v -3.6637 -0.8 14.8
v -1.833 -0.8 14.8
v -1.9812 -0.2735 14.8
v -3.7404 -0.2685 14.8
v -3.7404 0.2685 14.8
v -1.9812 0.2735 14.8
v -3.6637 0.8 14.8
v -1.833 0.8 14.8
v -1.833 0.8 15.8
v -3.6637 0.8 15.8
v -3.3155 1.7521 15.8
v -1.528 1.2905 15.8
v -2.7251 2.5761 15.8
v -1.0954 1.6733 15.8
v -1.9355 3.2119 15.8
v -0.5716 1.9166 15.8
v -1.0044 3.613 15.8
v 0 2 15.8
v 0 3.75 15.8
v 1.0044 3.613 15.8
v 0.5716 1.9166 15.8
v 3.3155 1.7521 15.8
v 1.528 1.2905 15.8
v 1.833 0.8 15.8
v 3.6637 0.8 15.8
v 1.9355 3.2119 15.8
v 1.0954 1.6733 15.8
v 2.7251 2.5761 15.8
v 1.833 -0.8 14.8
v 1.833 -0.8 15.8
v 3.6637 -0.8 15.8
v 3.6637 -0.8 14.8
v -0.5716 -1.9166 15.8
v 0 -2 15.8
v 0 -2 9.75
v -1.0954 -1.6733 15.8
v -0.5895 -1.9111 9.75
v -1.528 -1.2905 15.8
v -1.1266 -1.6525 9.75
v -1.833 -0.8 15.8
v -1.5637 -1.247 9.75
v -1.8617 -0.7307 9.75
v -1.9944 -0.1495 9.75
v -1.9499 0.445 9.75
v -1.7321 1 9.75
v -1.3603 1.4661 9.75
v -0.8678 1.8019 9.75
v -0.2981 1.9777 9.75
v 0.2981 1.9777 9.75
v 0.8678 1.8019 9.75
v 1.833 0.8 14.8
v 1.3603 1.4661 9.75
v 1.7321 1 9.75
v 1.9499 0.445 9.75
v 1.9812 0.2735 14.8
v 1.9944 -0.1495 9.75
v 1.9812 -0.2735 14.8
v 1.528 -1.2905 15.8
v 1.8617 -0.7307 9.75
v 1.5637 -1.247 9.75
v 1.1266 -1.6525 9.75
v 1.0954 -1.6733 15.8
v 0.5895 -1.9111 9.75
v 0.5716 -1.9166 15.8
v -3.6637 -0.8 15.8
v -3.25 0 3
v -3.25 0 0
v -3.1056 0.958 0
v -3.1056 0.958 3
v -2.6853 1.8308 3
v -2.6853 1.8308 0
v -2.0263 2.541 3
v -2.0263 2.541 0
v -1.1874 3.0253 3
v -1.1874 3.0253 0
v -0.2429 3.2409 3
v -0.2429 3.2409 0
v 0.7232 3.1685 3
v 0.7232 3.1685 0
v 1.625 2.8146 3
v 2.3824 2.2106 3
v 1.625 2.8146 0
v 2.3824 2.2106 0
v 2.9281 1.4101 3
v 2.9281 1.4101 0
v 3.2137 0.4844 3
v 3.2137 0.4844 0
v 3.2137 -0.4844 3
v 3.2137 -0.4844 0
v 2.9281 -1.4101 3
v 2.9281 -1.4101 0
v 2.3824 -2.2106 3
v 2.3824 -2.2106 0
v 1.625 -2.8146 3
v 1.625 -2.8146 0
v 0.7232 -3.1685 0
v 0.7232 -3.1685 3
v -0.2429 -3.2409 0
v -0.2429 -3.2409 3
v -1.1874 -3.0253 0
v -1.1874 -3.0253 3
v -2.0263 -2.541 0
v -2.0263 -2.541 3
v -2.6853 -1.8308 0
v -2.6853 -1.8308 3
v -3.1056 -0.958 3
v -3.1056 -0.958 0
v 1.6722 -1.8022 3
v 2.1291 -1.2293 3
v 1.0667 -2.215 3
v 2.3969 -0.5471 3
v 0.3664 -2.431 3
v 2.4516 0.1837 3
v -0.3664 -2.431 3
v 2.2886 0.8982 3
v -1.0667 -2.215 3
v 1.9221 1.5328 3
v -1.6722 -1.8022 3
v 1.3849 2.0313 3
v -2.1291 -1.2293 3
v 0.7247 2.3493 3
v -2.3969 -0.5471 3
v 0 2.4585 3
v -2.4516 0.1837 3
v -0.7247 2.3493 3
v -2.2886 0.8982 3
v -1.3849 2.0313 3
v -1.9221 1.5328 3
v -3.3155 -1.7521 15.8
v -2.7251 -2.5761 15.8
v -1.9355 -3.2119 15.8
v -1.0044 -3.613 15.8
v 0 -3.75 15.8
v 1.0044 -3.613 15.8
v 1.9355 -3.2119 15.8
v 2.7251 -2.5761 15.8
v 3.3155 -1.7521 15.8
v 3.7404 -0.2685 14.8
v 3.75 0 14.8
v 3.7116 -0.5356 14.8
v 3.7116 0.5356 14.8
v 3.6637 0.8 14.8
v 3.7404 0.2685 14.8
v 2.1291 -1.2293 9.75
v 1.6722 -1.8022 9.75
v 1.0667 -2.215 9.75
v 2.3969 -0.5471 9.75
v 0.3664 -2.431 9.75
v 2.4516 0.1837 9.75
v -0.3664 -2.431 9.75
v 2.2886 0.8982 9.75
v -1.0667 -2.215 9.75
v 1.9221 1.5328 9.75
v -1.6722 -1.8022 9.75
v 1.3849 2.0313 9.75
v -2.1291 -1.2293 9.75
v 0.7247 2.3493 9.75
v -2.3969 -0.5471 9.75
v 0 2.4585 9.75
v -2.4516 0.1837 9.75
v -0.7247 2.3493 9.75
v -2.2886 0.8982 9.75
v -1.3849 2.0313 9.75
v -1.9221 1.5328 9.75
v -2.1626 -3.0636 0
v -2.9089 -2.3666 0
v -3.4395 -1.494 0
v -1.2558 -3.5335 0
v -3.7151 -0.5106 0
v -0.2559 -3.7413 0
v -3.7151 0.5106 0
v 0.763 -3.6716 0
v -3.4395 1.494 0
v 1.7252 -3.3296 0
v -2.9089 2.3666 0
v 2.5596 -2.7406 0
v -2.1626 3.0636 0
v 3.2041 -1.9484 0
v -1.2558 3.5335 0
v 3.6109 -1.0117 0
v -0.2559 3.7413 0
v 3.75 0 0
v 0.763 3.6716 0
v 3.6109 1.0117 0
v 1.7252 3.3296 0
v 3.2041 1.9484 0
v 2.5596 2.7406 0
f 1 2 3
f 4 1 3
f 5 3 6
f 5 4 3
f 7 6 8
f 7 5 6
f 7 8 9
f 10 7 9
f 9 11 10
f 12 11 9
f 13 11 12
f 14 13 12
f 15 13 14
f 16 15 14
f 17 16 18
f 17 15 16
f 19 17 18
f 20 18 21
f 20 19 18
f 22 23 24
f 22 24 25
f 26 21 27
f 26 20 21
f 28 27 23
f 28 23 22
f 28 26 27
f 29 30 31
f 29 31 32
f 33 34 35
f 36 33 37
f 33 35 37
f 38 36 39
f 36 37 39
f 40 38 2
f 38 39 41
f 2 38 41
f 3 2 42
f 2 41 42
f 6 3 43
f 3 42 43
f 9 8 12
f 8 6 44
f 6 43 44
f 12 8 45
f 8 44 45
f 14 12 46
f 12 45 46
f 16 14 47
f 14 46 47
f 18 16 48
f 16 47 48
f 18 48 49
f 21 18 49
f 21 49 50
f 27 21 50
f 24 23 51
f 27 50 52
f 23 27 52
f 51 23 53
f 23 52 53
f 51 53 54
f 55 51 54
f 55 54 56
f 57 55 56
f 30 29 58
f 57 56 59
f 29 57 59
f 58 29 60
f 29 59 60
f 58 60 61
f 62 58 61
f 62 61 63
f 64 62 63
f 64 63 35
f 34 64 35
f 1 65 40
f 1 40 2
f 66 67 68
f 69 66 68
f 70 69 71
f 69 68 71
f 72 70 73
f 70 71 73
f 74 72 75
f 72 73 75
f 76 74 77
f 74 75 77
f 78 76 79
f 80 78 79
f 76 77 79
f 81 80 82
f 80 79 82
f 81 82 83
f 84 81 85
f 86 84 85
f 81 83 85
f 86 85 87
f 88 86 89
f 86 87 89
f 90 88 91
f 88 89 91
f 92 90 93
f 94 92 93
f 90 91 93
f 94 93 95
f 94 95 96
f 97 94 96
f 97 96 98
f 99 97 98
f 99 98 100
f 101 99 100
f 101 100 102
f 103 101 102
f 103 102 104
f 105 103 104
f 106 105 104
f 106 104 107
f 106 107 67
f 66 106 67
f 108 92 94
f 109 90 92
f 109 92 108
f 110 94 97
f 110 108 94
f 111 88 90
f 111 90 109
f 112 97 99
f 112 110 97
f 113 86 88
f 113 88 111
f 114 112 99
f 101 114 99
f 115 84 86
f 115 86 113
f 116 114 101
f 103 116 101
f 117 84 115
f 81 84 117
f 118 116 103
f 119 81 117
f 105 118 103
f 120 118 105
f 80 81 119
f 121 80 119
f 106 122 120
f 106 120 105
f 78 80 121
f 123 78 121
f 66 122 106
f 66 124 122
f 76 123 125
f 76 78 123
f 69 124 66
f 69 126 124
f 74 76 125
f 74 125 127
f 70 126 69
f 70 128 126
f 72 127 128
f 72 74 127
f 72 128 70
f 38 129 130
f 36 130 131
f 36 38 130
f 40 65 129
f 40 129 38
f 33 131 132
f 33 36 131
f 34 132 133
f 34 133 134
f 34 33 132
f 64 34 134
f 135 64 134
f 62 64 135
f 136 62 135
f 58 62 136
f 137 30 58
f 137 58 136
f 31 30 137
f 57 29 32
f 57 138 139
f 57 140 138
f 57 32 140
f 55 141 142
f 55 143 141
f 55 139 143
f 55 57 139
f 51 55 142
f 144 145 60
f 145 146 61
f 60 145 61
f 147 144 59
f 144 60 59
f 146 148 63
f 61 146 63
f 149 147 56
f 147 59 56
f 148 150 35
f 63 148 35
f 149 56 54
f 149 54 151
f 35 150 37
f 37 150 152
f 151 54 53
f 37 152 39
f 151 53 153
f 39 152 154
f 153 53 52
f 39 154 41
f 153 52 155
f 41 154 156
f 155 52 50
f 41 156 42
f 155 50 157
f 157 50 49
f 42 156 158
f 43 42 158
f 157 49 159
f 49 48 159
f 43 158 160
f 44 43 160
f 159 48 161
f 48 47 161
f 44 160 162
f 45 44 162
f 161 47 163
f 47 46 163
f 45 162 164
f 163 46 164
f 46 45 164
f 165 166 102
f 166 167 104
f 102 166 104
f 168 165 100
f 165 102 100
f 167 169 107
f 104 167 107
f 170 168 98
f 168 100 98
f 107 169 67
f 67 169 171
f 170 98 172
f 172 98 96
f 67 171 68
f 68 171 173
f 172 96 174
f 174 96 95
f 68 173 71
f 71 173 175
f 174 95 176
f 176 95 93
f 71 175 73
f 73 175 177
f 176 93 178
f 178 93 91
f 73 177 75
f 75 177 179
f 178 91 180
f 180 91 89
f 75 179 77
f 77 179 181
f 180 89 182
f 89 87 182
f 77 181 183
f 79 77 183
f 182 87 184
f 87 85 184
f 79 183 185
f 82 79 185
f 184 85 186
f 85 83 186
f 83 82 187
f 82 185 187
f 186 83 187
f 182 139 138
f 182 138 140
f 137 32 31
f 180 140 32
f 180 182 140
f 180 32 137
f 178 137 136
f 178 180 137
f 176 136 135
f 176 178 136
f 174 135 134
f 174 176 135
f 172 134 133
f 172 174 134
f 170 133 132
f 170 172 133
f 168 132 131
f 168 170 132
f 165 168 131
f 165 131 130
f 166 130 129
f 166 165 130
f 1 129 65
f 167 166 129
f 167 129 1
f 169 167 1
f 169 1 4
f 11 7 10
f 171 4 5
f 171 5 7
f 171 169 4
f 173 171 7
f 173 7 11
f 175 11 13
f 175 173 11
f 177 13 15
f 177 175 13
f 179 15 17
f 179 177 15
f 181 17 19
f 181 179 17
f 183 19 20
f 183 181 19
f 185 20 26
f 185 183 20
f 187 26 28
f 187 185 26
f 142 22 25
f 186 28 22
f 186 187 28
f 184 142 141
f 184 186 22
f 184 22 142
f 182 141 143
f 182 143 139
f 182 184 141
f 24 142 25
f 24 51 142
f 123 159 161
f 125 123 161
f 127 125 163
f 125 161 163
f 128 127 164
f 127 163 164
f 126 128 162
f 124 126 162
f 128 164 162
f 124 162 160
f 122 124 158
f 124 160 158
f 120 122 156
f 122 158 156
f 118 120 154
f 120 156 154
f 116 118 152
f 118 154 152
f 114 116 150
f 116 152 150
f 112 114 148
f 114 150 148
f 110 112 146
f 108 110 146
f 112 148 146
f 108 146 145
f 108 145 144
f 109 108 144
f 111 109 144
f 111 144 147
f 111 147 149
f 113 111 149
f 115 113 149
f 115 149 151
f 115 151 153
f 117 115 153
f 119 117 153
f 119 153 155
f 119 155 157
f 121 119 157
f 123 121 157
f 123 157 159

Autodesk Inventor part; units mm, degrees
ref_plane "YZ Plane" through (0, 0, 0) normal (1, 0, 0) x (0, 1, 0)
ref_plane "XZ Plane" through (0, 0, 0) normal (0, 1, 0) x (-1, 0, 0)
ref_plane "XY Plane" through (0, 0, 0) normal (0, 0, 1) x (1, 0, 0)
sketch "Sketch1" plane through (0, 0, 0) normal (0, 0, 1) x (1, 0, 0)
  circle A0 centre (0, 0) radius 3.75
  dimension "d0" = 7.5
extrude "Extrusion1" add sketch "Sketch1" along normal blind 15.8
sketch "Sketch2" plane through (0, 0, 0) normal (0, 0, -1) x (-1, 0, 0)
  circle A0 centre (0, 0) radius 3.75 projected
  circle A1 centre (0, 0) radius 3.25
  dimension "d3" = 6.5
extrude "Extrusion2" cut sketch "Sketch2" against normal blind 3 contours A1
hole "Hole1" at (0, 0, 3) direction (0, 0, 1) diameter 4.917 depth 6.75 thread size "M6x1" class "6H" standard "ANSI Metric M Profile"
hole "Hole2" at (0, 0, 15.8) direction (0, 0, -1) diameter 4 end through all
sketch "Sketch3" plane through (0, 0, 0) normal (1, 0, 0) x (0, 1, 0)
  line L0 (-2, 15.8) -> (2, 15.8) projected
  line L1 (0.8, 15.8) -> (-0.8, 15.8)
  line L2 (-0.8, 15.8) -> (-0.8, 14.8)
  line L3 (-0.8, 14.8) -> (0.8, 14.8)
  line L4 (0.8, 14.8) -> (0.8, 15.8)
  point P0 (0, 0)
  point P1 (0, 15.8)
  dimension "d26" = 1.6
  dimension "d27" = 1
extrude "Extrusion3" cut sketch "Sketch3" along normal through all both and the other way through all
properties part number "308-10" material "PC/ABS Plastic"
